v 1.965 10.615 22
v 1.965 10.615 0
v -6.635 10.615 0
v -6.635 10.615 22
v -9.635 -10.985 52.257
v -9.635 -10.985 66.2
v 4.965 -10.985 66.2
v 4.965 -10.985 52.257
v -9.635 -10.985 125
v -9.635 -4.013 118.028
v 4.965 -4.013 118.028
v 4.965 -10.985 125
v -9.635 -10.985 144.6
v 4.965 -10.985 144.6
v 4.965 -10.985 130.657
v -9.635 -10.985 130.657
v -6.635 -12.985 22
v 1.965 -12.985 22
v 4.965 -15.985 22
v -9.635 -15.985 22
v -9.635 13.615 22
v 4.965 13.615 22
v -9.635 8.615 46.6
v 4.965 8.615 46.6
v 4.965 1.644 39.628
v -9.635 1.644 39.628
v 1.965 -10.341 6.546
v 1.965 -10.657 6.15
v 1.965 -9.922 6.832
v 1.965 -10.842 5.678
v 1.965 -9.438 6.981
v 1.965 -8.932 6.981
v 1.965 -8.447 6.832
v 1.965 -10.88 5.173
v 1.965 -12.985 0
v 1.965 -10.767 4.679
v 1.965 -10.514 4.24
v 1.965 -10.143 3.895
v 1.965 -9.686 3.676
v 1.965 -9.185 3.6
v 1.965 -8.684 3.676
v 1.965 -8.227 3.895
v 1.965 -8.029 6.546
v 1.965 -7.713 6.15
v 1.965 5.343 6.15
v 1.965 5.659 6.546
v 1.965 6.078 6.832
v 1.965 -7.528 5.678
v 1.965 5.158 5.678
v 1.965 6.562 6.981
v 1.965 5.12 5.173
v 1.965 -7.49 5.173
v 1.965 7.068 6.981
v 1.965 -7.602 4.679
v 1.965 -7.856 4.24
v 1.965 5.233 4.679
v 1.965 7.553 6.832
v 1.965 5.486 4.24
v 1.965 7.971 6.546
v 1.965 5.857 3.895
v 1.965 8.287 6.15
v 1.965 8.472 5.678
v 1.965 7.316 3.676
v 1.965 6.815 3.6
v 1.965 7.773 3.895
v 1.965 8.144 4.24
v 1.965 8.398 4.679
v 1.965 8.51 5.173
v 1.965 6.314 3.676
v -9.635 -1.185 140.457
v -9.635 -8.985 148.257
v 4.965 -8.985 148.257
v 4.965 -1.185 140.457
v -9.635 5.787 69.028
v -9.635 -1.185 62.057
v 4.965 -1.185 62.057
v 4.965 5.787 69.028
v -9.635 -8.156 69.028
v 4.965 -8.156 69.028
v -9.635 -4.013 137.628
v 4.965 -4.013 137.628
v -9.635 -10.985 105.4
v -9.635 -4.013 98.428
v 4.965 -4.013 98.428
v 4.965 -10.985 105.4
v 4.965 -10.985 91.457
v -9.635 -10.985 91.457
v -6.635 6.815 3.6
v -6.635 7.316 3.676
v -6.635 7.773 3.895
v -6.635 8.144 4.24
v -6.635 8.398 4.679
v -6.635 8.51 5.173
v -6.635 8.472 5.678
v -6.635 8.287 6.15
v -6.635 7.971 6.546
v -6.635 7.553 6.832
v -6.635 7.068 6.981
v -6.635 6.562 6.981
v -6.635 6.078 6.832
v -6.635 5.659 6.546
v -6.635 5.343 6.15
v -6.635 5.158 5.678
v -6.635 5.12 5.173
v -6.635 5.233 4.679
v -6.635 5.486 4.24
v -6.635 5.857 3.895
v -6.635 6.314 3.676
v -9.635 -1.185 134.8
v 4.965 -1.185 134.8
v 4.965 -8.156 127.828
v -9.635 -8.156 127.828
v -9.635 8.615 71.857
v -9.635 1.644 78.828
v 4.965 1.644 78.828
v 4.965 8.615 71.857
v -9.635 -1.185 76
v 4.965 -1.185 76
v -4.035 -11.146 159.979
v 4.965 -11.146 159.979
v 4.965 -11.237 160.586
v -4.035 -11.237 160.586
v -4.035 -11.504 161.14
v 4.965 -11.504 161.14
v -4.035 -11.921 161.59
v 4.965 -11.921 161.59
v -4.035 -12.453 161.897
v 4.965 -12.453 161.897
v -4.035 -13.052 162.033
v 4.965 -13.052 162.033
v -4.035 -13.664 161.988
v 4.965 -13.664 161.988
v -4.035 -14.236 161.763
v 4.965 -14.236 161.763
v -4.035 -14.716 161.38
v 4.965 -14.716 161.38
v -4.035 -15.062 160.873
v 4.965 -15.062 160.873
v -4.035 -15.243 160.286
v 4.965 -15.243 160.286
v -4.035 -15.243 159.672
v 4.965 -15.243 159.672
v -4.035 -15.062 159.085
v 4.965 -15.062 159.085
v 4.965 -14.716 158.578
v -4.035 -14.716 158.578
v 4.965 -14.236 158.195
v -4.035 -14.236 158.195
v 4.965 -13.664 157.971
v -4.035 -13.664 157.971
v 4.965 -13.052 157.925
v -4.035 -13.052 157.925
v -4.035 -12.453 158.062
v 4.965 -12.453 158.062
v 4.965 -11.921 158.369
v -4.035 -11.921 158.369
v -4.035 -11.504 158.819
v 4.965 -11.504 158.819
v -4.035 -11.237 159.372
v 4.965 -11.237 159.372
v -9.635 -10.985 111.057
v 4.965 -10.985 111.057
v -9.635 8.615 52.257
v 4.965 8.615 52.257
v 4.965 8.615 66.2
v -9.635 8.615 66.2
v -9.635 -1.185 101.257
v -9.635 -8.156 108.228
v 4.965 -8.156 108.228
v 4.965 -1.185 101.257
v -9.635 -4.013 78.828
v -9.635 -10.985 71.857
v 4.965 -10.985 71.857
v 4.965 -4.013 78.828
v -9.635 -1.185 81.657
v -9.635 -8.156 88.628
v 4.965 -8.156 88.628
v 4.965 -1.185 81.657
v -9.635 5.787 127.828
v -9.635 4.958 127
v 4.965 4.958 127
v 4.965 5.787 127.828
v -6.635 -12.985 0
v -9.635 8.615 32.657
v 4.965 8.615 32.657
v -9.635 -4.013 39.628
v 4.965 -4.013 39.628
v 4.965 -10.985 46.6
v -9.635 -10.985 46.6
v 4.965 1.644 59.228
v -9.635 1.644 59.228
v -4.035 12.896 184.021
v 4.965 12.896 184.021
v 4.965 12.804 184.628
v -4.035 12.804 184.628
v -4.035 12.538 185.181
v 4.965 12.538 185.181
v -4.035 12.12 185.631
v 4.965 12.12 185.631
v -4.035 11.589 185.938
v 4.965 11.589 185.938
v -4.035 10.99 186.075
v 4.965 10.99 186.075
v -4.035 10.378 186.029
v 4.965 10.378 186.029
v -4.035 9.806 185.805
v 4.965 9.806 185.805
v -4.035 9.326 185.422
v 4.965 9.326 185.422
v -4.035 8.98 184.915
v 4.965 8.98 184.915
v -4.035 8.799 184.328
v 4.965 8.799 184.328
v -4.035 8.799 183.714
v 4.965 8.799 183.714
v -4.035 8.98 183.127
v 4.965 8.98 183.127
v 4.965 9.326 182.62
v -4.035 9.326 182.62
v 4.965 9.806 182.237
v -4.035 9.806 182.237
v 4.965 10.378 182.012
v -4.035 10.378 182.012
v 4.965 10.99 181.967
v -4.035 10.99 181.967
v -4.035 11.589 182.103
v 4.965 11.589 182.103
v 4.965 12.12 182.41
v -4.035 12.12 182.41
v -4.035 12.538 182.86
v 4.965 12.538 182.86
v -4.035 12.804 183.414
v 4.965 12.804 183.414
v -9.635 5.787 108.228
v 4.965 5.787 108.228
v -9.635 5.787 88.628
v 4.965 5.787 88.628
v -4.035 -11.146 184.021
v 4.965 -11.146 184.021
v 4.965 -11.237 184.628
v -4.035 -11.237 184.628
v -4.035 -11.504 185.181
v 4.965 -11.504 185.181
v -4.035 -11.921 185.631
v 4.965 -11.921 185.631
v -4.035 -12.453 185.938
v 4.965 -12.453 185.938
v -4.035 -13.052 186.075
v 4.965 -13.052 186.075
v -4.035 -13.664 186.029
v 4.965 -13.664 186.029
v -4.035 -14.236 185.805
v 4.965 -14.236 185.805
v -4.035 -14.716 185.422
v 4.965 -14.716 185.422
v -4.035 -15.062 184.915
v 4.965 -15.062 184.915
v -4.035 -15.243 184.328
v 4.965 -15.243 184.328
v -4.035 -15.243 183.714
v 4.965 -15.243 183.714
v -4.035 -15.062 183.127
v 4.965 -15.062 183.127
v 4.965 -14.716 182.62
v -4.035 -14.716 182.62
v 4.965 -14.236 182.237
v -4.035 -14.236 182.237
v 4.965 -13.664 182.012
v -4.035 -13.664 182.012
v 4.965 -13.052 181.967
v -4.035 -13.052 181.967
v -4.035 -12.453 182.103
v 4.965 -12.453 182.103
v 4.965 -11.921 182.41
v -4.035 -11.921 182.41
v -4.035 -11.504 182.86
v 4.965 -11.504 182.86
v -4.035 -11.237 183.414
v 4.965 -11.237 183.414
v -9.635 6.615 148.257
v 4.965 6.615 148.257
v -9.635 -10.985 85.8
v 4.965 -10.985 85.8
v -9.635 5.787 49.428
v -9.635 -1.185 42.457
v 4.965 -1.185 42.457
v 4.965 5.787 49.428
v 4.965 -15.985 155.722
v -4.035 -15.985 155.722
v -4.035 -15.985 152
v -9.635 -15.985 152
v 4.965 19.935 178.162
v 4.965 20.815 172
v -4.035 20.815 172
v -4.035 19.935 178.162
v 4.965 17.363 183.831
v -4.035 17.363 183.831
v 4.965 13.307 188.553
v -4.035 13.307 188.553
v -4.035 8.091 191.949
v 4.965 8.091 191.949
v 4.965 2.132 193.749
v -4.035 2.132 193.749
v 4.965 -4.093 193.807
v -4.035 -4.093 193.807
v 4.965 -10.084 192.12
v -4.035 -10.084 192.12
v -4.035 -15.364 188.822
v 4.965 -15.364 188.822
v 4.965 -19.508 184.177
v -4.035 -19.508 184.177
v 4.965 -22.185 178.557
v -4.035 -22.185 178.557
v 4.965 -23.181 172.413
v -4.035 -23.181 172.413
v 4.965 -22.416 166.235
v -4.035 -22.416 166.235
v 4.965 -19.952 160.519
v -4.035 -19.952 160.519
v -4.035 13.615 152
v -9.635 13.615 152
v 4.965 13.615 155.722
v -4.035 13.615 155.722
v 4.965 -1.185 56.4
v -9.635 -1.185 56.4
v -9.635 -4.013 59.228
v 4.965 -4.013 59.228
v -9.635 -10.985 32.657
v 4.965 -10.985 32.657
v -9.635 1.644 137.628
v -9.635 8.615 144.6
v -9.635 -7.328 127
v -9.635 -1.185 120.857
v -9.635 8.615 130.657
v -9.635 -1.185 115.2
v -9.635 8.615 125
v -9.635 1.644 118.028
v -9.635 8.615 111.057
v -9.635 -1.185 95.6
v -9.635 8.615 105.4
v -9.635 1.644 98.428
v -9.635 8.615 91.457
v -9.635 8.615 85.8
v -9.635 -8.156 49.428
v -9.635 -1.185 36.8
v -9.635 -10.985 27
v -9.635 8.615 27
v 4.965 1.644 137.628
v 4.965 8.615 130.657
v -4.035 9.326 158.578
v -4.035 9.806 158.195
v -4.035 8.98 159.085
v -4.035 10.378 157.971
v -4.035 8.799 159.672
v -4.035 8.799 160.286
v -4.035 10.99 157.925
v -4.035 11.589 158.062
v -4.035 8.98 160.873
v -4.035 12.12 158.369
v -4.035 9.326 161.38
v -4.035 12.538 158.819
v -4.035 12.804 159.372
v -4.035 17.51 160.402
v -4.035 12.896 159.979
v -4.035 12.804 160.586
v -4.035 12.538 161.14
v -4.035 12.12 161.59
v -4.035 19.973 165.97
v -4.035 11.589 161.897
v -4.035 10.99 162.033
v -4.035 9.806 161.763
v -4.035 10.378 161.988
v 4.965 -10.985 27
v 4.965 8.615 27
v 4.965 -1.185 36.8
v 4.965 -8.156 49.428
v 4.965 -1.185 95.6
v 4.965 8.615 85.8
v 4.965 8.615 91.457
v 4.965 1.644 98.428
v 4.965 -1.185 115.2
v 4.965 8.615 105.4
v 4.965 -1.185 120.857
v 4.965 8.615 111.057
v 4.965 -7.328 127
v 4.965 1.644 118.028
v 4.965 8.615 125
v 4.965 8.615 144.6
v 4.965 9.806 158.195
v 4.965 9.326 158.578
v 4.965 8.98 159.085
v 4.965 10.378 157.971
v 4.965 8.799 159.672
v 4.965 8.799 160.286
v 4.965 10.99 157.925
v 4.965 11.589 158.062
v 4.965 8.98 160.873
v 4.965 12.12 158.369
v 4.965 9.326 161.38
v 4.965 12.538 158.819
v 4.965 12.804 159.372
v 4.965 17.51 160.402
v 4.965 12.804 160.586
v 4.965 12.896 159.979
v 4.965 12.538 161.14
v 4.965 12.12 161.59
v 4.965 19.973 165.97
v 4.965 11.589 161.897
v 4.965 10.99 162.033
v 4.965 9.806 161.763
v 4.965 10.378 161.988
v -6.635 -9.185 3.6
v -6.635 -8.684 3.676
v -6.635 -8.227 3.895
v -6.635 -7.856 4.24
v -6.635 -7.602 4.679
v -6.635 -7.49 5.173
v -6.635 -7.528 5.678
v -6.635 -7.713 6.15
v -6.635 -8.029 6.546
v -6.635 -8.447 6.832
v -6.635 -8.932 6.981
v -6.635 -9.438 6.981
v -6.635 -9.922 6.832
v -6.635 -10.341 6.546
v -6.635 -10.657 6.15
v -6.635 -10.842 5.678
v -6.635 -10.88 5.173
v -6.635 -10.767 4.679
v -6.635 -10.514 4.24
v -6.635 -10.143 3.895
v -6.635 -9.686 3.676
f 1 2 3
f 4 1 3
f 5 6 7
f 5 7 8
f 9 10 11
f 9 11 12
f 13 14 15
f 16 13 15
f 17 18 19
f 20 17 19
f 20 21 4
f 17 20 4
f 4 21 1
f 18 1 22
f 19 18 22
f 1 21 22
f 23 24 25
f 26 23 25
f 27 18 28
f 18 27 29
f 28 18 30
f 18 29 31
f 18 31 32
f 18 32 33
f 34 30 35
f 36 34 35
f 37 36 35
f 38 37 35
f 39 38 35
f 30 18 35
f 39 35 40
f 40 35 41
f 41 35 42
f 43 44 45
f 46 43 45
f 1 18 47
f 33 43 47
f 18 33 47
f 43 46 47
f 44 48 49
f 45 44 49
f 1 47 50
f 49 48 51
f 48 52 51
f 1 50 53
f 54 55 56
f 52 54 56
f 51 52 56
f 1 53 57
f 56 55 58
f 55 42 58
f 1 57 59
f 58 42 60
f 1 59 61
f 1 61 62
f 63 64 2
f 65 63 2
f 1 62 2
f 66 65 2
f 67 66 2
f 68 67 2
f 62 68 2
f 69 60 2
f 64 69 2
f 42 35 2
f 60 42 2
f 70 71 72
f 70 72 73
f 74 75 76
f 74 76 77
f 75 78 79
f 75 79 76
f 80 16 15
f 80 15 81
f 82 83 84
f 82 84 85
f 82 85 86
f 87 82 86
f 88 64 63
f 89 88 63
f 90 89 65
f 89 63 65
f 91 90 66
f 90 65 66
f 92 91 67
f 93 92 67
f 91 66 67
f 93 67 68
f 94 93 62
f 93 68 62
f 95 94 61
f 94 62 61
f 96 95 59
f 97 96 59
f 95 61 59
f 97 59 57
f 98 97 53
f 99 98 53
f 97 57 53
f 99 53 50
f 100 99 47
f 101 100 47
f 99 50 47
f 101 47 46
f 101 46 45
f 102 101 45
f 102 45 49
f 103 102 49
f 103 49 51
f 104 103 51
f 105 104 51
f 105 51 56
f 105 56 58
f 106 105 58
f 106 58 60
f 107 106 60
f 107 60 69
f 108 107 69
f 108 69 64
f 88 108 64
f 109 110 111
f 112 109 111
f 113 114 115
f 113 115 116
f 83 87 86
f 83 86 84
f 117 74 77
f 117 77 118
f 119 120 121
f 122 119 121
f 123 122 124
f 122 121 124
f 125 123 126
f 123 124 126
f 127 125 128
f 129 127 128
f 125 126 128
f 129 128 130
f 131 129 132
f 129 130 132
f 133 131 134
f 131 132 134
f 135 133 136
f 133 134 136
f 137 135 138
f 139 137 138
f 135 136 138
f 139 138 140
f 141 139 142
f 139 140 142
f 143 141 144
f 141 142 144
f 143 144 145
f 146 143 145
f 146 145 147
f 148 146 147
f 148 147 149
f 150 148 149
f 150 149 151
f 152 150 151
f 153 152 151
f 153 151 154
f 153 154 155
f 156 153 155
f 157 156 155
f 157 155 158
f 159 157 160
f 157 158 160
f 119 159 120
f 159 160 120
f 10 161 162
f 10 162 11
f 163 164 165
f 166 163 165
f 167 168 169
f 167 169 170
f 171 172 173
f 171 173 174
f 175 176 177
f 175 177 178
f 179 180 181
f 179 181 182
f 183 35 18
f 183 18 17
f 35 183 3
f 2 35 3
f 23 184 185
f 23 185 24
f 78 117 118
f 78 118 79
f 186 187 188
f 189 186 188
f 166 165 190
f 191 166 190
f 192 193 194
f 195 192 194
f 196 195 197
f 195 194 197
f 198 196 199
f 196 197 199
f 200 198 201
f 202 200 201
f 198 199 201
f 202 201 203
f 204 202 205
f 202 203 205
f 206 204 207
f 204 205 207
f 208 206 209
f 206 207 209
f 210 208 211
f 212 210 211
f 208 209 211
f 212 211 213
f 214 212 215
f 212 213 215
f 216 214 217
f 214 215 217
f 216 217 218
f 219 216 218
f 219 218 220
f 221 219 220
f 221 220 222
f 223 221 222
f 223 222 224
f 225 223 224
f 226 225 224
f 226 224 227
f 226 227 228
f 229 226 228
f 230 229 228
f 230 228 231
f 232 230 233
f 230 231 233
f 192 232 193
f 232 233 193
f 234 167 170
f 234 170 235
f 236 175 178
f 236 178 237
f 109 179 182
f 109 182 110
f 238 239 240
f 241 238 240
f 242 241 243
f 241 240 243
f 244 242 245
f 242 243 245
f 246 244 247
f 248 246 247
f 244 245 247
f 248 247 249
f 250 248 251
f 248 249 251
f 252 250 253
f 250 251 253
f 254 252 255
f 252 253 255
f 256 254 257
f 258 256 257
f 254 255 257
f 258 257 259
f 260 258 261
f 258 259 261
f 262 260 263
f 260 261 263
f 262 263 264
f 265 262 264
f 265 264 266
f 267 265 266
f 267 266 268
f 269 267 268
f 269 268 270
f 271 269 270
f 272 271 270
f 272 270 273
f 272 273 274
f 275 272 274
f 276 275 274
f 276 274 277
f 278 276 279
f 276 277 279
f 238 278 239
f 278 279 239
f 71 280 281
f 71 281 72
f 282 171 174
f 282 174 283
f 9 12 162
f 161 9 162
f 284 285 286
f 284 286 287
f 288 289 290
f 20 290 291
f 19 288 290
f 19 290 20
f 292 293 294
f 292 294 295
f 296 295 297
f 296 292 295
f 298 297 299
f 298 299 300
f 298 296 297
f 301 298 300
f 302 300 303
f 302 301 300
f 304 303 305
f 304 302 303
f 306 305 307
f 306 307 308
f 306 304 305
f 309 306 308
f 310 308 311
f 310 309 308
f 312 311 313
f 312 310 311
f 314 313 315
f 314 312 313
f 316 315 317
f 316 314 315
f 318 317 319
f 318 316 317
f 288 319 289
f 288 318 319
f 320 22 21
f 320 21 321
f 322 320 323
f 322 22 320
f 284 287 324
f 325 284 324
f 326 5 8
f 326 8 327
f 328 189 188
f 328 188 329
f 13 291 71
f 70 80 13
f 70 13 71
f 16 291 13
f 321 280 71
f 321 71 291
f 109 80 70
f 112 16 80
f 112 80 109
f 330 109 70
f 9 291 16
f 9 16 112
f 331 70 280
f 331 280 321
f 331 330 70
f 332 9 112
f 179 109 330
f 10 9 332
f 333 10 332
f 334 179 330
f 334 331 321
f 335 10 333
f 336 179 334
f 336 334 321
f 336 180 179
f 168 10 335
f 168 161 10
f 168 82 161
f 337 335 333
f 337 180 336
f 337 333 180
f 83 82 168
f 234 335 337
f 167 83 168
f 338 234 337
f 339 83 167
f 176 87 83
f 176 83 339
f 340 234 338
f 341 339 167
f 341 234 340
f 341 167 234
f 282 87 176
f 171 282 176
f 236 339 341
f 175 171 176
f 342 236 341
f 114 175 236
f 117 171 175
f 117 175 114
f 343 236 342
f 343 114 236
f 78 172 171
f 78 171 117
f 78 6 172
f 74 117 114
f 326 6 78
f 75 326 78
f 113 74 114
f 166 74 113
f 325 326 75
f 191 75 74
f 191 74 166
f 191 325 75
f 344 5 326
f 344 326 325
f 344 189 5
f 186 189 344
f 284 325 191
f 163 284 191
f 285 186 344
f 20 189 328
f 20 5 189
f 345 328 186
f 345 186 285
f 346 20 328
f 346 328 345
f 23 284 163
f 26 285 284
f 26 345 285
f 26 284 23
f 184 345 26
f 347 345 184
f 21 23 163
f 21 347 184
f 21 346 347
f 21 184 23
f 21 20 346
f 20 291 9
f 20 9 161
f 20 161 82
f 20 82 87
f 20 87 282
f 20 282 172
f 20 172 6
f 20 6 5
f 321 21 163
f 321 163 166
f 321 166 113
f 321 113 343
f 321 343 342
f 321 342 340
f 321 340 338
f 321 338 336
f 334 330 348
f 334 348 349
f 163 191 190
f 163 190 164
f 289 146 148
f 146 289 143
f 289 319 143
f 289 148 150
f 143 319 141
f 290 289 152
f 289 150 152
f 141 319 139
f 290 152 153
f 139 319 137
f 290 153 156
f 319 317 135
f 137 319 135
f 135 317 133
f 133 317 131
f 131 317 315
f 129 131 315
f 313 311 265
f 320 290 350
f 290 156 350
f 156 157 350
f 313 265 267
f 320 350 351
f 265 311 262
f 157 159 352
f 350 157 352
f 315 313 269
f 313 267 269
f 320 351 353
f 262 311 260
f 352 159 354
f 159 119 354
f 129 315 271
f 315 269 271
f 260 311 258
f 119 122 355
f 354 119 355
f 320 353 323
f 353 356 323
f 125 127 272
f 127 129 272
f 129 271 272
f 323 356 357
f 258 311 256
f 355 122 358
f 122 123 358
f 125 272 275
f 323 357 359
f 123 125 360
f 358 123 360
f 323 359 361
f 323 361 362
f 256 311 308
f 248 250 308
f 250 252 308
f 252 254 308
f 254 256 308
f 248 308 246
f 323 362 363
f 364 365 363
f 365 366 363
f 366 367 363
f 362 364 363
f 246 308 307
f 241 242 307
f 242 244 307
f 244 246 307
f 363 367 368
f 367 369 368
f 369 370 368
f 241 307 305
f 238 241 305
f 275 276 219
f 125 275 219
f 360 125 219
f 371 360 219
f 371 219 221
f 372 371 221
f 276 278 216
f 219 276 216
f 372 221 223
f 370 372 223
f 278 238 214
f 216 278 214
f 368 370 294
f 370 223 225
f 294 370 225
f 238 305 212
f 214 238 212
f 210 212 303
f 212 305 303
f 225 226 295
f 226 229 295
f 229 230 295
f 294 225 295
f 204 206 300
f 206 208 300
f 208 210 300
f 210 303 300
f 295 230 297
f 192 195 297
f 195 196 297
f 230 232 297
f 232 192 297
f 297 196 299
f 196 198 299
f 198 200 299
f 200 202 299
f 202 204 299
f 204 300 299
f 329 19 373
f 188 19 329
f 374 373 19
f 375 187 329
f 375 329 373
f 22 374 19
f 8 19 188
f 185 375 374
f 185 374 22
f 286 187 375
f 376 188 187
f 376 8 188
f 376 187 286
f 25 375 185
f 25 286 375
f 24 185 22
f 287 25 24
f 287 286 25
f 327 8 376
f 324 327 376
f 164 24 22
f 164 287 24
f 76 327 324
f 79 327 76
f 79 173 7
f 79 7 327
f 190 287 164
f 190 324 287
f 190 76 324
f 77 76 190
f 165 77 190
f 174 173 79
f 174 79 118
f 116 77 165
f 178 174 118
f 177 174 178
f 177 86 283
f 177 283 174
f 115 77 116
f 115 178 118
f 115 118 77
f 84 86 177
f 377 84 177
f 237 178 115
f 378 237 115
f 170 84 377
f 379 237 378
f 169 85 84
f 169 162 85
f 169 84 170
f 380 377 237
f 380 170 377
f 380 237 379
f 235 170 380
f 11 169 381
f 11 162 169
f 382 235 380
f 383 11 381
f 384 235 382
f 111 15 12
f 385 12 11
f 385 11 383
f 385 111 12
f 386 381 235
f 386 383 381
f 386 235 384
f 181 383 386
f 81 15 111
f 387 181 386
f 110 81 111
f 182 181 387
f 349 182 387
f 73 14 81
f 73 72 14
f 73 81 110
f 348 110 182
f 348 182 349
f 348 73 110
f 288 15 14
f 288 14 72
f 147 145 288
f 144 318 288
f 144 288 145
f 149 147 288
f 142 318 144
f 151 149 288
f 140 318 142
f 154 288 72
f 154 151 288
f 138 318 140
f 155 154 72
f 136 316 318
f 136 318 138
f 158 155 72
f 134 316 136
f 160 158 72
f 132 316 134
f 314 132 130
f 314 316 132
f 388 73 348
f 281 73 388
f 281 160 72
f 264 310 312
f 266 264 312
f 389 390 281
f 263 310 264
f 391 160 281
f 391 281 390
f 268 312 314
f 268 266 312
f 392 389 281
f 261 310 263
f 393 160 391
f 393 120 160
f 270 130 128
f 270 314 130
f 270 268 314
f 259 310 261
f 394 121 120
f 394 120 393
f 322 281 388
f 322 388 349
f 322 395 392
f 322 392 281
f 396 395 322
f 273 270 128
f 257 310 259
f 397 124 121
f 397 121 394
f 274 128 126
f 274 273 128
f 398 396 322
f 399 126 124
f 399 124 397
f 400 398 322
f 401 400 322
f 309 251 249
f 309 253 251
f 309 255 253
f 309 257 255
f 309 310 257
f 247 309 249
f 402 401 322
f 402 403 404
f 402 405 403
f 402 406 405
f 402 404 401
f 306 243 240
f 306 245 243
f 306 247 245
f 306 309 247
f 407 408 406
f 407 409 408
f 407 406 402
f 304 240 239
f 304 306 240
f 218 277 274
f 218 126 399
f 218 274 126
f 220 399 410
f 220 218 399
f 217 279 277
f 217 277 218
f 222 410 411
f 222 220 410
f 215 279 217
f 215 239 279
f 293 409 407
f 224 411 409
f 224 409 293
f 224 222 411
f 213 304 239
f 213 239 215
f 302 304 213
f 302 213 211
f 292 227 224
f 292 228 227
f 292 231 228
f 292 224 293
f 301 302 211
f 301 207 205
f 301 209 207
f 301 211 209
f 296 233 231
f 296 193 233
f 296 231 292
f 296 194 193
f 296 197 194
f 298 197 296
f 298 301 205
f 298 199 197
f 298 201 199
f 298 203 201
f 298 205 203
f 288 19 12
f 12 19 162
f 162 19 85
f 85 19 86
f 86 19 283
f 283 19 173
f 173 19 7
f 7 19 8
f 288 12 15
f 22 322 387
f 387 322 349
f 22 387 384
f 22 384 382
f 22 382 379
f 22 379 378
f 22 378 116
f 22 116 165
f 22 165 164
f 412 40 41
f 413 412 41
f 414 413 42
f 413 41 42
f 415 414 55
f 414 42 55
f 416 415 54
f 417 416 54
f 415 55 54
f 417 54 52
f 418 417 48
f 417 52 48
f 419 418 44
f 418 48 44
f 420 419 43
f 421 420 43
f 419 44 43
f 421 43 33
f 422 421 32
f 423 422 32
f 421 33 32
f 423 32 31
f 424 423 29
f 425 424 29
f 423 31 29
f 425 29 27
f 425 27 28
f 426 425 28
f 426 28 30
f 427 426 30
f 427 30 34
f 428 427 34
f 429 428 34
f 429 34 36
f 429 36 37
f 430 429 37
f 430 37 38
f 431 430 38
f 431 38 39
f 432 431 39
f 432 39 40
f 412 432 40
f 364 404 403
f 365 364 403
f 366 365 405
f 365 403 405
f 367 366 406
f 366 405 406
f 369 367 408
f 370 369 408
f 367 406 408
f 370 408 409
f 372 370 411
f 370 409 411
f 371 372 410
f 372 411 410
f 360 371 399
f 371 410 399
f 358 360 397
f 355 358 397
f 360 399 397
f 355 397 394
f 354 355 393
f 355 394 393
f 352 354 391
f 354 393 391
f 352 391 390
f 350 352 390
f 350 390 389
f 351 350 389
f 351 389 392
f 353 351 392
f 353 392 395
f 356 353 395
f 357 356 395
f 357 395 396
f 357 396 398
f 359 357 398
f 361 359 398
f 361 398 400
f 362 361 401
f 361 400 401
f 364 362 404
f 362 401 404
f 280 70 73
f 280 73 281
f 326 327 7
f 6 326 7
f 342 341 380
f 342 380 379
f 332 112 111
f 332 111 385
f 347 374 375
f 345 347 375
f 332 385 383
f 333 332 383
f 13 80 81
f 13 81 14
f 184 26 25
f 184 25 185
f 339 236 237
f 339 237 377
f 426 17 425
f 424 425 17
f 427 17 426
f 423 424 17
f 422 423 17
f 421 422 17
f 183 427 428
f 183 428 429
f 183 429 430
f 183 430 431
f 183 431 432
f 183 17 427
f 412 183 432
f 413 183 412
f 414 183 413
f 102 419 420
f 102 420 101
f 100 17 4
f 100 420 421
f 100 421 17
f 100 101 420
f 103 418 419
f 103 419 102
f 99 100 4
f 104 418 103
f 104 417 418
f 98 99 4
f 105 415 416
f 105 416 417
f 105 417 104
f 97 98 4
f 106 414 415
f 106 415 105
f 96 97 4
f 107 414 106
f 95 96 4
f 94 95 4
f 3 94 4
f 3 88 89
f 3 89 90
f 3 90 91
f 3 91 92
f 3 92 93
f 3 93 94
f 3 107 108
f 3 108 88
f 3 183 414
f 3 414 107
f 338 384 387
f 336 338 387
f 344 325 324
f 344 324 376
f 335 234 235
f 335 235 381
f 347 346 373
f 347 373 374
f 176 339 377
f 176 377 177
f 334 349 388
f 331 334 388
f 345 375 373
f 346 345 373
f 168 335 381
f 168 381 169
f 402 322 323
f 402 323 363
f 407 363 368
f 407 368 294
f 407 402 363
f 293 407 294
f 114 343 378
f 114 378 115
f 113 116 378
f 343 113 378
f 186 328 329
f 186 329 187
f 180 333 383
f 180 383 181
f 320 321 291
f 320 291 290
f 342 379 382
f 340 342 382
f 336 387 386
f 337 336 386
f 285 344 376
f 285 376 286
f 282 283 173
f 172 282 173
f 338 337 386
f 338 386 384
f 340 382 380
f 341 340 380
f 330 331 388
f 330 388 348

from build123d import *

# Parameters (mm, degrees)
SKETCH1_W               = 23.6
SKETCH1_H               = 8.6
BOSS_EXTRUDE1_DEPTH     = 22
SKETCH2_W               = 14.6
SKETCH2_H               = 29.6
BOSS_EXTRUDE2_DEPTH     = 130
SKETCH3_R               = 1.7
CUT_EXTRUDE1_DEPTH      = 9
CUT_EXTRUDE2_DEPTH      = 154.533959474
CUT_EXTRUDE2_DEPTH_BACK = 19
SKETCH5_R               = 2.06
BOSS_EXTRUDE3_DEPTH     = 9


with BuildPart() as part:
    # Sketch1 → Boss-Extrude1 (new body)
    with BuildSketch(Plane(origin=(0, 0, 0), x_dir=(0, 1, 0), z_dir=(0, 0, 1))):
        with Locations((-1.18489011, 2.334615385)):
            Rectangle(SKETCH1_W, SKETCH1_H)
    extrude(amount=BOSS_EXTRUDE1_DEPTH)

    # Sketch2 → Boss-Extrude2 (add)
    with BuildSketch(Plane.XY.offset(22)):
        with Locations((-2.334615385, -1.18489011)):
            Rectangle(SKETCH2_W, SKETCH2_H)
    extrude(amount=BOSS_EXTRUDE2_DEPTH)

    # Sketch3 → Cut-Extrude1 (cut)
    with BuildSketch(Plane.YZ.offset(1.965384615)):
        with Locations(Location((6.81510989, 5.3, 0), (0, 0, 270))):
            Circle(SKETCH3_R)
        with Locations(Location((-9.18489011, 5.3, 0), (0, 0, 270))):
            Circle(SKETCH3_R)
    extrude(amount=-CUT_EXTRUDE1_DEPTH, mode=Mode.SUBTRACT)

    # Sketch4 → Cut-Extrude2 (cut, two sides: drawn at the far end of the back side and taken through both)
    with BuildSketch(Plane.YZ.offset(4.965384615).offset(-CUT_EXTRUDE2_DEPTH_BACK)):
        Polygon((-4.013317235, 118.028427125), (-10.98489011, 125), (-10.98489011, 111.056854249), align=None)
        Polygon((4.958255641, 127), (-7.32803586, 127), (-1.18489011, 120.856854249), align=None)
        Polygon((8.61510989, 125), (1.643537015, 118.028427125), (8.61510989, 111.056854249), align=None)
        Polygon((-1.18489011, 115.2), (-8.156462985, 108.228427125), (-1.18489011, 101.256854249), (5.786682765, 108.228427125), align=None)
        Polygon((-4.013317235, 98.428427125), (-10.98489011, 105.4), (-10.98489011, 91.456854249), align=None)
        Polygon((8.61510989, 105.4), (1.643537015, 98.428427125), (8.61510989, 91.456854249), align=None)
        Polygon((-1.18489011, 95.6), (-8.156462985, 88.628427125), (-1.18489011, 81.656854249), (5.786682765, 88.628427125), align=None)
        Polygon((-4.013317235, 78.828427125), (-10.98489011, 85.8), (-10.98489011, 71.856854249), align=None)
        Polygon((8.61510989, 85.8), (1.643537015, 78.828427125), (8.61510989, 71.856854249), align=None)
        Polygon((-1.18489011, 76), (-8.156462985, 69.028427125), (-1.18489011, 62.056854249), (5.786682765, 69.028427125), align=None)
        Polygon((-10.98489011, 66.2), (-10.98489011, 52.256854249), (-4.013317235, 59.228427125), align=None)
        Polygon((1.643537015, 59.228427125), (8.61510989, 52.256854249), (8.61510989, 66.2), align=None)
        Polygon((-1.18489011, 56.4), (-8.156462985, 49.428427125), (-1.18489011, 42.456854249), (5.786682765, 49.428427125), align=None)
        Polygon((-10.98489011, 46.6), (-10.98489011, 32.656854249), (-4.013317235, 39.628427125), align=None)
        Polygon((1.643537015, 39.628427125), (8.61510989, 32.656854249), (8.61510989, 46.6), align=None)
        Polygon((-1.18489011, 36.8), (-10.98489011, 27), (8.61510989, 27), align=None)
        Polygon((-8.156462985, 127.828427125), (-7.32803586, 127), (4.958255641, 127), (5.786682765, 127.828427125), (-1.18489011, 134.8), align=None)
        Polygon((-10.98489011, 144.6), (-10.98489011, 130.656854249), (-4.013317235, 137.628427125), align=None)
        Polygon((-8.98489011, 148.256854249), (-1.18489011, 140.456854249), (6.61510989, 148.256854249), align=None)
        Polygon((8.61510989, 144.6), (1.643537015, 137.628427125), (8.61510989, 130.656854249), align=None)
    extrude(amount=CUT_EXTRUDE2_DEPTH + CUT_EXTRUDE2_DEPTH_BACK, mode=Mode.SUBTRACT)

    # Sketch5 → Boss-Extrude3 (add)
    # profile 1 of 3: a face of its own
    with BuildSketch(Plane.YZ.offset(4.965384615)):
        with BuildLine():
            Line((-15.98489011, 155.72240804), (-15.98489011, 152))
            Line((-15.98489011, 152), (-10.3500415, 152))
            ThreePointArc((-10.3500415, 152), (-13.311150898, 153.643698648), (-15.98489011, 155.72240804))
        make_face()
    # profile 2 of 3: a face of its own
    with BuildSketch(Plane.YZ.offset(4.965384615)):
        with BuildLine():
            ThreePointArc((13.61510989, 155.72240804), (10.941370678, 153.643698648), (7.98026128, 152))
            Line((7.98026128, 152), (13.61510989, 152))
            Line((13.61510989, 152), (13.61510989, 155.72240804))
        make_face()
    # profile 3 of 3: a face of its own
    with BuildSketch(Plane.YZ.offset(4.965384615)):
        with BuildLine():
            ThreePointArc((20.81510989, 172), (-10.084328294, 192.119642144), (-15.98489011, 155.72240804))
            ThreePointArc((-15.98489011, 155.72240804), (-13.311150898, 153.643698648), (-10.3500415, 152))
            Line((-10.3500415, 152), (7.98026128, 152))
            ThreePointArc((7.98026128, 152), (10.941370678, 153.643698648), (13.61510989, 155.72240804))
            ThreePointArc((13.61510989, 155.72240804), (18.934752034, 163.100561815), (20.81510989, 172))
        make_face()
        with Locations((-13.20570539, 159.97918472)):
            Circle(SKETCH5_R, mode=Mode.SUBTRACT)
        with Locations((-13.20570539, 184.02081528)):
            Circle(SKETCH5_R, mode=Mode.SUBTRACT)
        with Locations((10.83592517, 159.97918472)):
            Circle(SKETCH5_R, mode=Mode.SUBTRACT)
        with Locations((10.83592517, 184.02081528)):
            Circle(SKETCH5_R, mode=Mode.SUBTRACT)
    extrude(amount=-BOSS_EXTRUDE3_DEPTH)


solid = part.part
